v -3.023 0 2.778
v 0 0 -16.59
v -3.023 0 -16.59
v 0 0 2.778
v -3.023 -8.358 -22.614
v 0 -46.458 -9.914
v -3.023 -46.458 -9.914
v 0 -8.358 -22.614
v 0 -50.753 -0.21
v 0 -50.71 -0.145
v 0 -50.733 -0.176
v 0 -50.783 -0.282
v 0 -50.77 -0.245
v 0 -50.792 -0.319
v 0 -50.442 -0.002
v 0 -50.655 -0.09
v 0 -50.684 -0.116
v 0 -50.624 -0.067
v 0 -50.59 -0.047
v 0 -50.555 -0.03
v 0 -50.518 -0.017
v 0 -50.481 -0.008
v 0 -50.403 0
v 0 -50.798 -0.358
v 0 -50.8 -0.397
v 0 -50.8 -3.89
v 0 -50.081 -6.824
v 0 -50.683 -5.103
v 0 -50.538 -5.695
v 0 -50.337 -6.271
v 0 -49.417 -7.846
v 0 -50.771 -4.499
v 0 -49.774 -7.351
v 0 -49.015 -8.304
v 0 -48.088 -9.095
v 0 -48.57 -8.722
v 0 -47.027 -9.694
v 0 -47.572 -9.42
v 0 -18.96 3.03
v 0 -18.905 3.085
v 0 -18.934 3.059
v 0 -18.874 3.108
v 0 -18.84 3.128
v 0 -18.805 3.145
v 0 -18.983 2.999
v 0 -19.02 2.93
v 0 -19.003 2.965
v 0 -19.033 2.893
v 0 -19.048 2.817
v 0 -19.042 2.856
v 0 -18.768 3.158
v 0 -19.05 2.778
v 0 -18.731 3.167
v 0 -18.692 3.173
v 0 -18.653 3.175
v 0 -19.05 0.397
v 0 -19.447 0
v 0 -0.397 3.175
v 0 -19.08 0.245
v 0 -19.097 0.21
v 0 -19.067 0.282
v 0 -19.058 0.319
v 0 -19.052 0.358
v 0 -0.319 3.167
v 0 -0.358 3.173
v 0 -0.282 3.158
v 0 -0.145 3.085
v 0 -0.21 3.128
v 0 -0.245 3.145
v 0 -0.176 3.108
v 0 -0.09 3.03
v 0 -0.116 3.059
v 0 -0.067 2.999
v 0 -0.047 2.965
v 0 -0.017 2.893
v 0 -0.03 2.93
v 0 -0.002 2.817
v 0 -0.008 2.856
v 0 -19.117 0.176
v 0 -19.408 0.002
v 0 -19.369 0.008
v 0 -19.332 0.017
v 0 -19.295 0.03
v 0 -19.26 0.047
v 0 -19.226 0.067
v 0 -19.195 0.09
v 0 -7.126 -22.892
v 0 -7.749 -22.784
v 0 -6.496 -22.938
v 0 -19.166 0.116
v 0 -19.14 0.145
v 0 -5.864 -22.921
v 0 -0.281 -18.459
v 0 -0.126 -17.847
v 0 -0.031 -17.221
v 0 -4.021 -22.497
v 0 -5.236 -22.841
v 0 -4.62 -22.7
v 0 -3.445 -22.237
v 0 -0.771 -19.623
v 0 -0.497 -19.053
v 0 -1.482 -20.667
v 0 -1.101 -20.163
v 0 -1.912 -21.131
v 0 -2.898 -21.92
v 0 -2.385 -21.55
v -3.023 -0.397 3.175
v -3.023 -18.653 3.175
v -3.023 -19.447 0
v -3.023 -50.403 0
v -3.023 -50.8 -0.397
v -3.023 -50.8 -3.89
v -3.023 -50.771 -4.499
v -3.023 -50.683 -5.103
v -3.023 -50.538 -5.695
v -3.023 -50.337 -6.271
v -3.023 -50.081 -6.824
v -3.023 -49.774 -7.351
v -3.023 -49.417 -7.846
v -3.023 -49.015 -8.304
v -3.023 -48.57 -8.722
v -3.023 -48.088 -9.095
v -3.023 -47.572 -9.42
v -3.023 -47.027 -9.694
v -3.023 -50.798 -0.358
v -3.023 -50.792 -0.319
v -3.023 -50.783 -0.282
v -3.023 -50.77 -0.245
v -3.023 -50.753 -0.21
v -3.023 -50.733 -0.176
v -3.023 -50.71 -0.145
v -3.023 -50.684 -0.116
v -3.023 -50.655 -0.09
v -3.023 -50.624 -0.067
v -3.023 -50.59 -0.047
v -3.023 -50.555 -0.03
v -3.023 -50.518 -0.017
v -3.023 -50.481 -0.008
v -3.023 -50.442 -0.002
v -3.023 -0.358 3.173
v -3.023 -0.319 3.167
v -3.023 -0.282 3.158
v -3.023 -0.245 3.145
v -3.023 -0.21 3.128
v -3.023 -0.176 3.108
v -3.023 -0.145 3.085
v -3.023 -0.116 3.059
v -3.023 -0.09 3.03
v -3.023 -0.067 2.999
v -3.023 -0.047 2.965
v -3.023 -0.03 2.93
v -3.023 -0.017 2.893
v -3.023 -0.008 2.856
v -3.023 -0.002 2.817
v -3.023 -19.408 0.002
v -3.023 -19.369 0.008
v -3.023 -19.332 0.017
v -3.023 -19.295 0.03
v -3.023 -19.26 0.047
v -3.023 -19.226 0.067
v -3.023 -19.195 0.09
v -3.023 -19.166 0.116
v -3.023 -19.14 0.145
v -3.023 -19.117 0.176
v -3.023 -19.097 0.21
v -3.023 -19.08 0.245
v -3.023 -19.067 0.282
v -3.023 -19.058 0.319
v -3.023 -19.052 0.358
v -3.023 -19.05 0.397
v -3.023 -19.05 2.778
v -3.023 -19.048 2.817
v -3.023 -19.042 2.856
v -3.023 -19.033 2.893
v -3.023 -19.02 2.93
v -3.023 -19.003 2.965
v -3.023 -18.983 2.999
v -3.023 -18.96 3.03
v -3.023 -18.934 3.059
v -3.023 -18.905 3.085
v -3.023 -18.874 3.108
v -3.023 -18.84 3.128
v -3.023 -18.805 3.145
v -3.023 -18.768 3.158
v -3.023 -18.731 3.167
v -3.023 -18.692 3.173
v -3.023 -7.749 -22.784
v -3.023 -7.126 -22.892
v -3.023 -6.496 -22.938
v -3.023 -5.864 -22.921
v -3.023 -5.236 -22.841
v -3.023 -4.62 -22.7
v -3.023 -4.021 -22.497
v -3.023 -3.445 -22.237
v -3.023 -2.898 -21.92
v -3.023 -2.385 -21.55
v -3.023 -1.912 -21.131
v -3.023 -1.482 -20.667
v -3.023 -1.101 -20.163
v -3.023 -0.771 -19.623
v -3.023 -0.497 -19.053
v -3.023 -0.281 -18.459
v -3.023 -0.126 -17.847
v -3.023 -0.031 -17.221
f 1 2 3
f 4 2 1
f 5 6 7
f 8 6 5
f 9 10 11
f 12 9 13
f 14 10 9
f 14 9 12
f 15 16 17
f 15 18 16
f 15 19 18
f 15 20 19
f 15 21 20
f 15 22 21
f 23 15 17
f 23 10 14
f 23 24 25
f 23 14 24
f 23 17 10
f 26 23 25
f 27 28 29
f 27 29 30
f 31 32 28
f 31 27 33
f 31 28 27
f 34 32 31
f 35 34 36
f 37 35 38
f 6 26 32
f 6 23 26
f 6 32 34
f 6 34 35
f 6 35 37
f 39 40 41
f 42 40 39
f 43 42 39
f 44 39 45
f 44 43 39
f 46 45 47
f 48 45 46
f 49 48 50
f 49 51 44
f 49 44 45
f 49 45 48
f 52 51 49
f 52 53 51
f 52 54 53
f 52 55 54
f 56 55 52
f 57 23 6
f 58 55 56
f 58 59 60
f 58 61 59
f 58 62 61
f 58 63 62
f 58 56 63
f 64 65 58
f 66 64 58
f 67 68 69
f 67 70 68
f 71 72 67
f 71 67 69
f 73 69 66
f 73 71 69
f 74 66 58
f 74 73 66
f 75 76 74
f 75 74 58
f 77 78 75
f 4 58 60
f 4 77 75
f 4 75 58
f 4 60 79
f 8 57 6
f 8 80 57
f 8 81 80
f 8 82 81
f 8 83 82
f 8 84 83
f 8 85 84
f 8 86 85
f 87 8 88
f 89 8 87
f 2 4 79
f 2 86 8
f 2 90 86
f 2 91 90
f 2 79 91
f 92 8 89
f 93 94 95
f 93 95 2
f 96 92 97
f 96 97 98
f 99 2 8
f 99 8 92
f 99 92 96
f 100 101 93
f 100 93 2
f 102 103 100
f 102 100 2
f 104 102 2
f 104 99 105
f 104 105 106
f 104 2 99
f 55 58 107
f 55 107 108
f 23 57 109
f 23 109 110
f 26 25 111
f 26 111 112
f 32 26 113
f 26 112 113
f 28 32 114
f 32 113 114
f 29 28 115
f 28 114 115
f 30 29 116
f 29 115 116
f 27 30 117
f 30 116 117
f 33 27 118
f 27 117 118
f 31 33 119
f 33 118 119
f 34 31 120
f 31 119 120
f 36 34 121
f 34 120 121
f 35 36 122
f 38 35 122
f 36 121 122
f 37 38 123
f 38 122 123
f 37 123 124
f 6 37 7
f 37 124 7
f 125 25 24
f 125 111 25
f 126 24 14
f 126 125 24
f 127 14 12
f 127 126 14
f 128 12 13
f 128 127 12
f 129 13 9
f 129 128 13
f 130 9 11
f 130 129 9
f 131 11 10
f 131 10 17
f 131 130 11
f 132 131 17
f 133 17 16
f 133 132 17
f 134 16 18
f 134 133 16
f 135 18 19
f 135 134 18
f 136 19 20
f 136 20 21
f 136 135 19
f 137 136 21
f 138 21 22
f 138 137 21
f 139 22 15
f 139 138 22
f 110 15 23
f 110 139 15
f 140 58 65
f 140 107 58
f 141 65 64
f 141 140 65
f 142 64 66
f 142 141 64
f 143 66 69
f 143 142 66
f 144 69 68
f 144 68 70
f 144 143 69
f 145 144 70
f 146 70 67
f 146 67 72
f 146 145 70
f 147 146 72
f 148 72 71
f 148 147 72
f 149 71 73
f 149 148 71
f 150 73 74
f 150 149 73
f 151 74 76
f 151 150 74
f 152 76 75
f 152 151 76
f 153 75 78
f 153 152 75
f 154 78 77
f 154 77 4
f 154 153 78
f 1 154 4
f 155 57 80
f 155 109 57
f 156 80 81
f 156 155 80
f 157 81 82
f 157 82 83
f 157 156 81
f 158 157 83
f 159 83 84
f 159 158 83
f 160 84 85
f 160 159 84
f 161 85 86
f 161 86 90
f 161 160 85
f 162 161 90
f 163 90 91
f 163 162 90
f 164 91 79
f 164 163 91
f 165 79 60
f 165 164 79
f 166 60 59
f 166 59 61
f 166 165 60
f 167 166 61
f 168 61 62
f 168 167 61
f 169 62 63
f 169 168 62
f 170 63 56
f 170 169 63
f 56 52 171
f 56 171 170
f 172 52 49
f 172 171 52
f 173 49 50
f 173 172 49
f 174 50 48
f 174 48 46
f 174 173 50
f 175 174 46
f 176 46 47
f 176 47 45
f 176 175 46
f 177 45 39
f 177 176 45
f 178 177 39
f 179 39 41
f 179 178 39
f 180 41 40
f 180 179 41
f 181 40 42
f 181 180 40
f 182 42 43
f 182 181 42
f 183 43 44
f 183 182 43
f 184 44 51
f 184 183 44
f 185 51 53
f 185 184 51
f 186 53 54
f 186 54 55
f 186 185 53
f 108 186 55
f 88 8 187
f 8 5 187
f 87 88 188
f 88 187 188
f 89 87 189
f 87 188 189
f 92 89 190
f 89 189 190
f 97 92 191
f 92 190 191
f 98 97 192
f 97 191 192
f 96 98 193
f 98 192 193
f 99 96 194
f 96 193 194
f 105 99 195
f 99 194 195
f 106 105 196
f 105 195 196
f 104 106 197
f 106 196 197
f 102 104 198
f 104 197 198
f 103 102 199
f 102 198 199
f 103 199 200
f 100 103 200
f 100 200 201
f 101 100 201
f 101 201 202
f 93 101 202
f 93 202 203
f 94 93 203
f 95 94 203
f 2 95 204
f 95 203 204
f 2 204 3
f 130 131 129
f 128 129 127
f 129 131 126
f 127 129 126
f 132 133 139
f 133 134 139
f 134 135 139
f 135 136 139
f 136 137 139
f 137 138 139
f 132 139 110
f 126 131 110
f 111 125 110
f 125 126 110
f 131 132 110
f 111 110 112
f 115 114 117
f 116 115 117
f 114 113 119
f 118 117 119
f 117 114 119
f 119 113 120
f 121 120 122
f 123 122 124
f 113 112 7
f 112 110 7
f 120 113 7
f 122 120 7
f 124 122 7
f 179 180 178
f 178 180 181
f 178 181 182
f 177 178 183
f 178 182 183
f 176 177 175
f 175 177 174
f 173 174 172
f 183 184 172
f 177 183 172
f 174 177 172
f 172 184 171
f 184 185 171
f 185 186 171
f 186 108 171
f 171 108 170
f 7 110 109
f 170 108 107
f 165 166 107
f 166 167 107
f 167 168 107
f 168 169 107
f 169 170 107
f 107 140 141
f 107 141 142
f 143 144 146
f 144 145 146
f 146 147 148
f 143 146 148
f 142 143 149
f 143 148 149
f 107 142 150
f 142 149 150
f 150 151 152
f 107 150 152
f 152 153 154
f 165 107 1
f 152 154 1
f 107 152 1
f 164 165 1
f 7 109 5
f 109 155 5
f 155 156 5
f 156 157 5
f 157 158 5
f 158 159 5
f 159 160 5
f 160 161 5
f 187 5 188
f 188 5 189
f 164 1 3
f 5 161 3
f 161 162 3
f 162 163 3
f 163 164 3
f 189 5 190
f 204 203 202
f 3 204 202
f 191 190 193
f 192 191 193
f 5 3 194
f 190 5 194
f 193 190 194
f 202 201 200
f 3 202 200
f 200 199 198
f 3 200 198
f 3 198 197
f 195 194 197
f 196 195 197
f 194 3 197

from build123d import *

# Parameters (mm, degrees)
BASE_FLANGE1_DEPTH = 3.0226
FILLET1_R          = 6.35
FILLET2_R          = 0.396875


# Sheet-metal steps are written as plain solids
with BuildPart() as part:
    # Sketch1 → Base-Flange1 (new body)
    with BuildSketch(Plane(origin=(0, 0, 0), x_dir=(0, 0, -1), z_dir=(1, 0, 0))):
        Polygon((0, -19.05), (0, -50.8), (8.466666667, -50.8), (25.4, 0), (0, 0), (-3.175, 0), (-3.175, -19.05), align=None)
    extrude(amount=-BASE_FLANGE1_DEPTH)

    # Fillet1
    fillet1_edges = [part.edges().sort_by_distance(p)[0] for p in [
        (-1.5113, 0, -25.4),
        (-1.5113, -50.8, -8.466666667),
    ]]
    fillet(fillet1_edges, radius=FILLET1_R)

    # Fillet2
    fillet2_edges = [part.edges().sort_by_distance(p)[0] for p in [
        (-1.5113, -50.8, 0),
        (-1.5113, -19.05, 0),
        (-1.5113, -19.05, 3.175),
        (-1.5113, 0, 3.175),
    ]]
    fillet(fillet2_edges, radius=FILLET2_R)


solid = part.part
